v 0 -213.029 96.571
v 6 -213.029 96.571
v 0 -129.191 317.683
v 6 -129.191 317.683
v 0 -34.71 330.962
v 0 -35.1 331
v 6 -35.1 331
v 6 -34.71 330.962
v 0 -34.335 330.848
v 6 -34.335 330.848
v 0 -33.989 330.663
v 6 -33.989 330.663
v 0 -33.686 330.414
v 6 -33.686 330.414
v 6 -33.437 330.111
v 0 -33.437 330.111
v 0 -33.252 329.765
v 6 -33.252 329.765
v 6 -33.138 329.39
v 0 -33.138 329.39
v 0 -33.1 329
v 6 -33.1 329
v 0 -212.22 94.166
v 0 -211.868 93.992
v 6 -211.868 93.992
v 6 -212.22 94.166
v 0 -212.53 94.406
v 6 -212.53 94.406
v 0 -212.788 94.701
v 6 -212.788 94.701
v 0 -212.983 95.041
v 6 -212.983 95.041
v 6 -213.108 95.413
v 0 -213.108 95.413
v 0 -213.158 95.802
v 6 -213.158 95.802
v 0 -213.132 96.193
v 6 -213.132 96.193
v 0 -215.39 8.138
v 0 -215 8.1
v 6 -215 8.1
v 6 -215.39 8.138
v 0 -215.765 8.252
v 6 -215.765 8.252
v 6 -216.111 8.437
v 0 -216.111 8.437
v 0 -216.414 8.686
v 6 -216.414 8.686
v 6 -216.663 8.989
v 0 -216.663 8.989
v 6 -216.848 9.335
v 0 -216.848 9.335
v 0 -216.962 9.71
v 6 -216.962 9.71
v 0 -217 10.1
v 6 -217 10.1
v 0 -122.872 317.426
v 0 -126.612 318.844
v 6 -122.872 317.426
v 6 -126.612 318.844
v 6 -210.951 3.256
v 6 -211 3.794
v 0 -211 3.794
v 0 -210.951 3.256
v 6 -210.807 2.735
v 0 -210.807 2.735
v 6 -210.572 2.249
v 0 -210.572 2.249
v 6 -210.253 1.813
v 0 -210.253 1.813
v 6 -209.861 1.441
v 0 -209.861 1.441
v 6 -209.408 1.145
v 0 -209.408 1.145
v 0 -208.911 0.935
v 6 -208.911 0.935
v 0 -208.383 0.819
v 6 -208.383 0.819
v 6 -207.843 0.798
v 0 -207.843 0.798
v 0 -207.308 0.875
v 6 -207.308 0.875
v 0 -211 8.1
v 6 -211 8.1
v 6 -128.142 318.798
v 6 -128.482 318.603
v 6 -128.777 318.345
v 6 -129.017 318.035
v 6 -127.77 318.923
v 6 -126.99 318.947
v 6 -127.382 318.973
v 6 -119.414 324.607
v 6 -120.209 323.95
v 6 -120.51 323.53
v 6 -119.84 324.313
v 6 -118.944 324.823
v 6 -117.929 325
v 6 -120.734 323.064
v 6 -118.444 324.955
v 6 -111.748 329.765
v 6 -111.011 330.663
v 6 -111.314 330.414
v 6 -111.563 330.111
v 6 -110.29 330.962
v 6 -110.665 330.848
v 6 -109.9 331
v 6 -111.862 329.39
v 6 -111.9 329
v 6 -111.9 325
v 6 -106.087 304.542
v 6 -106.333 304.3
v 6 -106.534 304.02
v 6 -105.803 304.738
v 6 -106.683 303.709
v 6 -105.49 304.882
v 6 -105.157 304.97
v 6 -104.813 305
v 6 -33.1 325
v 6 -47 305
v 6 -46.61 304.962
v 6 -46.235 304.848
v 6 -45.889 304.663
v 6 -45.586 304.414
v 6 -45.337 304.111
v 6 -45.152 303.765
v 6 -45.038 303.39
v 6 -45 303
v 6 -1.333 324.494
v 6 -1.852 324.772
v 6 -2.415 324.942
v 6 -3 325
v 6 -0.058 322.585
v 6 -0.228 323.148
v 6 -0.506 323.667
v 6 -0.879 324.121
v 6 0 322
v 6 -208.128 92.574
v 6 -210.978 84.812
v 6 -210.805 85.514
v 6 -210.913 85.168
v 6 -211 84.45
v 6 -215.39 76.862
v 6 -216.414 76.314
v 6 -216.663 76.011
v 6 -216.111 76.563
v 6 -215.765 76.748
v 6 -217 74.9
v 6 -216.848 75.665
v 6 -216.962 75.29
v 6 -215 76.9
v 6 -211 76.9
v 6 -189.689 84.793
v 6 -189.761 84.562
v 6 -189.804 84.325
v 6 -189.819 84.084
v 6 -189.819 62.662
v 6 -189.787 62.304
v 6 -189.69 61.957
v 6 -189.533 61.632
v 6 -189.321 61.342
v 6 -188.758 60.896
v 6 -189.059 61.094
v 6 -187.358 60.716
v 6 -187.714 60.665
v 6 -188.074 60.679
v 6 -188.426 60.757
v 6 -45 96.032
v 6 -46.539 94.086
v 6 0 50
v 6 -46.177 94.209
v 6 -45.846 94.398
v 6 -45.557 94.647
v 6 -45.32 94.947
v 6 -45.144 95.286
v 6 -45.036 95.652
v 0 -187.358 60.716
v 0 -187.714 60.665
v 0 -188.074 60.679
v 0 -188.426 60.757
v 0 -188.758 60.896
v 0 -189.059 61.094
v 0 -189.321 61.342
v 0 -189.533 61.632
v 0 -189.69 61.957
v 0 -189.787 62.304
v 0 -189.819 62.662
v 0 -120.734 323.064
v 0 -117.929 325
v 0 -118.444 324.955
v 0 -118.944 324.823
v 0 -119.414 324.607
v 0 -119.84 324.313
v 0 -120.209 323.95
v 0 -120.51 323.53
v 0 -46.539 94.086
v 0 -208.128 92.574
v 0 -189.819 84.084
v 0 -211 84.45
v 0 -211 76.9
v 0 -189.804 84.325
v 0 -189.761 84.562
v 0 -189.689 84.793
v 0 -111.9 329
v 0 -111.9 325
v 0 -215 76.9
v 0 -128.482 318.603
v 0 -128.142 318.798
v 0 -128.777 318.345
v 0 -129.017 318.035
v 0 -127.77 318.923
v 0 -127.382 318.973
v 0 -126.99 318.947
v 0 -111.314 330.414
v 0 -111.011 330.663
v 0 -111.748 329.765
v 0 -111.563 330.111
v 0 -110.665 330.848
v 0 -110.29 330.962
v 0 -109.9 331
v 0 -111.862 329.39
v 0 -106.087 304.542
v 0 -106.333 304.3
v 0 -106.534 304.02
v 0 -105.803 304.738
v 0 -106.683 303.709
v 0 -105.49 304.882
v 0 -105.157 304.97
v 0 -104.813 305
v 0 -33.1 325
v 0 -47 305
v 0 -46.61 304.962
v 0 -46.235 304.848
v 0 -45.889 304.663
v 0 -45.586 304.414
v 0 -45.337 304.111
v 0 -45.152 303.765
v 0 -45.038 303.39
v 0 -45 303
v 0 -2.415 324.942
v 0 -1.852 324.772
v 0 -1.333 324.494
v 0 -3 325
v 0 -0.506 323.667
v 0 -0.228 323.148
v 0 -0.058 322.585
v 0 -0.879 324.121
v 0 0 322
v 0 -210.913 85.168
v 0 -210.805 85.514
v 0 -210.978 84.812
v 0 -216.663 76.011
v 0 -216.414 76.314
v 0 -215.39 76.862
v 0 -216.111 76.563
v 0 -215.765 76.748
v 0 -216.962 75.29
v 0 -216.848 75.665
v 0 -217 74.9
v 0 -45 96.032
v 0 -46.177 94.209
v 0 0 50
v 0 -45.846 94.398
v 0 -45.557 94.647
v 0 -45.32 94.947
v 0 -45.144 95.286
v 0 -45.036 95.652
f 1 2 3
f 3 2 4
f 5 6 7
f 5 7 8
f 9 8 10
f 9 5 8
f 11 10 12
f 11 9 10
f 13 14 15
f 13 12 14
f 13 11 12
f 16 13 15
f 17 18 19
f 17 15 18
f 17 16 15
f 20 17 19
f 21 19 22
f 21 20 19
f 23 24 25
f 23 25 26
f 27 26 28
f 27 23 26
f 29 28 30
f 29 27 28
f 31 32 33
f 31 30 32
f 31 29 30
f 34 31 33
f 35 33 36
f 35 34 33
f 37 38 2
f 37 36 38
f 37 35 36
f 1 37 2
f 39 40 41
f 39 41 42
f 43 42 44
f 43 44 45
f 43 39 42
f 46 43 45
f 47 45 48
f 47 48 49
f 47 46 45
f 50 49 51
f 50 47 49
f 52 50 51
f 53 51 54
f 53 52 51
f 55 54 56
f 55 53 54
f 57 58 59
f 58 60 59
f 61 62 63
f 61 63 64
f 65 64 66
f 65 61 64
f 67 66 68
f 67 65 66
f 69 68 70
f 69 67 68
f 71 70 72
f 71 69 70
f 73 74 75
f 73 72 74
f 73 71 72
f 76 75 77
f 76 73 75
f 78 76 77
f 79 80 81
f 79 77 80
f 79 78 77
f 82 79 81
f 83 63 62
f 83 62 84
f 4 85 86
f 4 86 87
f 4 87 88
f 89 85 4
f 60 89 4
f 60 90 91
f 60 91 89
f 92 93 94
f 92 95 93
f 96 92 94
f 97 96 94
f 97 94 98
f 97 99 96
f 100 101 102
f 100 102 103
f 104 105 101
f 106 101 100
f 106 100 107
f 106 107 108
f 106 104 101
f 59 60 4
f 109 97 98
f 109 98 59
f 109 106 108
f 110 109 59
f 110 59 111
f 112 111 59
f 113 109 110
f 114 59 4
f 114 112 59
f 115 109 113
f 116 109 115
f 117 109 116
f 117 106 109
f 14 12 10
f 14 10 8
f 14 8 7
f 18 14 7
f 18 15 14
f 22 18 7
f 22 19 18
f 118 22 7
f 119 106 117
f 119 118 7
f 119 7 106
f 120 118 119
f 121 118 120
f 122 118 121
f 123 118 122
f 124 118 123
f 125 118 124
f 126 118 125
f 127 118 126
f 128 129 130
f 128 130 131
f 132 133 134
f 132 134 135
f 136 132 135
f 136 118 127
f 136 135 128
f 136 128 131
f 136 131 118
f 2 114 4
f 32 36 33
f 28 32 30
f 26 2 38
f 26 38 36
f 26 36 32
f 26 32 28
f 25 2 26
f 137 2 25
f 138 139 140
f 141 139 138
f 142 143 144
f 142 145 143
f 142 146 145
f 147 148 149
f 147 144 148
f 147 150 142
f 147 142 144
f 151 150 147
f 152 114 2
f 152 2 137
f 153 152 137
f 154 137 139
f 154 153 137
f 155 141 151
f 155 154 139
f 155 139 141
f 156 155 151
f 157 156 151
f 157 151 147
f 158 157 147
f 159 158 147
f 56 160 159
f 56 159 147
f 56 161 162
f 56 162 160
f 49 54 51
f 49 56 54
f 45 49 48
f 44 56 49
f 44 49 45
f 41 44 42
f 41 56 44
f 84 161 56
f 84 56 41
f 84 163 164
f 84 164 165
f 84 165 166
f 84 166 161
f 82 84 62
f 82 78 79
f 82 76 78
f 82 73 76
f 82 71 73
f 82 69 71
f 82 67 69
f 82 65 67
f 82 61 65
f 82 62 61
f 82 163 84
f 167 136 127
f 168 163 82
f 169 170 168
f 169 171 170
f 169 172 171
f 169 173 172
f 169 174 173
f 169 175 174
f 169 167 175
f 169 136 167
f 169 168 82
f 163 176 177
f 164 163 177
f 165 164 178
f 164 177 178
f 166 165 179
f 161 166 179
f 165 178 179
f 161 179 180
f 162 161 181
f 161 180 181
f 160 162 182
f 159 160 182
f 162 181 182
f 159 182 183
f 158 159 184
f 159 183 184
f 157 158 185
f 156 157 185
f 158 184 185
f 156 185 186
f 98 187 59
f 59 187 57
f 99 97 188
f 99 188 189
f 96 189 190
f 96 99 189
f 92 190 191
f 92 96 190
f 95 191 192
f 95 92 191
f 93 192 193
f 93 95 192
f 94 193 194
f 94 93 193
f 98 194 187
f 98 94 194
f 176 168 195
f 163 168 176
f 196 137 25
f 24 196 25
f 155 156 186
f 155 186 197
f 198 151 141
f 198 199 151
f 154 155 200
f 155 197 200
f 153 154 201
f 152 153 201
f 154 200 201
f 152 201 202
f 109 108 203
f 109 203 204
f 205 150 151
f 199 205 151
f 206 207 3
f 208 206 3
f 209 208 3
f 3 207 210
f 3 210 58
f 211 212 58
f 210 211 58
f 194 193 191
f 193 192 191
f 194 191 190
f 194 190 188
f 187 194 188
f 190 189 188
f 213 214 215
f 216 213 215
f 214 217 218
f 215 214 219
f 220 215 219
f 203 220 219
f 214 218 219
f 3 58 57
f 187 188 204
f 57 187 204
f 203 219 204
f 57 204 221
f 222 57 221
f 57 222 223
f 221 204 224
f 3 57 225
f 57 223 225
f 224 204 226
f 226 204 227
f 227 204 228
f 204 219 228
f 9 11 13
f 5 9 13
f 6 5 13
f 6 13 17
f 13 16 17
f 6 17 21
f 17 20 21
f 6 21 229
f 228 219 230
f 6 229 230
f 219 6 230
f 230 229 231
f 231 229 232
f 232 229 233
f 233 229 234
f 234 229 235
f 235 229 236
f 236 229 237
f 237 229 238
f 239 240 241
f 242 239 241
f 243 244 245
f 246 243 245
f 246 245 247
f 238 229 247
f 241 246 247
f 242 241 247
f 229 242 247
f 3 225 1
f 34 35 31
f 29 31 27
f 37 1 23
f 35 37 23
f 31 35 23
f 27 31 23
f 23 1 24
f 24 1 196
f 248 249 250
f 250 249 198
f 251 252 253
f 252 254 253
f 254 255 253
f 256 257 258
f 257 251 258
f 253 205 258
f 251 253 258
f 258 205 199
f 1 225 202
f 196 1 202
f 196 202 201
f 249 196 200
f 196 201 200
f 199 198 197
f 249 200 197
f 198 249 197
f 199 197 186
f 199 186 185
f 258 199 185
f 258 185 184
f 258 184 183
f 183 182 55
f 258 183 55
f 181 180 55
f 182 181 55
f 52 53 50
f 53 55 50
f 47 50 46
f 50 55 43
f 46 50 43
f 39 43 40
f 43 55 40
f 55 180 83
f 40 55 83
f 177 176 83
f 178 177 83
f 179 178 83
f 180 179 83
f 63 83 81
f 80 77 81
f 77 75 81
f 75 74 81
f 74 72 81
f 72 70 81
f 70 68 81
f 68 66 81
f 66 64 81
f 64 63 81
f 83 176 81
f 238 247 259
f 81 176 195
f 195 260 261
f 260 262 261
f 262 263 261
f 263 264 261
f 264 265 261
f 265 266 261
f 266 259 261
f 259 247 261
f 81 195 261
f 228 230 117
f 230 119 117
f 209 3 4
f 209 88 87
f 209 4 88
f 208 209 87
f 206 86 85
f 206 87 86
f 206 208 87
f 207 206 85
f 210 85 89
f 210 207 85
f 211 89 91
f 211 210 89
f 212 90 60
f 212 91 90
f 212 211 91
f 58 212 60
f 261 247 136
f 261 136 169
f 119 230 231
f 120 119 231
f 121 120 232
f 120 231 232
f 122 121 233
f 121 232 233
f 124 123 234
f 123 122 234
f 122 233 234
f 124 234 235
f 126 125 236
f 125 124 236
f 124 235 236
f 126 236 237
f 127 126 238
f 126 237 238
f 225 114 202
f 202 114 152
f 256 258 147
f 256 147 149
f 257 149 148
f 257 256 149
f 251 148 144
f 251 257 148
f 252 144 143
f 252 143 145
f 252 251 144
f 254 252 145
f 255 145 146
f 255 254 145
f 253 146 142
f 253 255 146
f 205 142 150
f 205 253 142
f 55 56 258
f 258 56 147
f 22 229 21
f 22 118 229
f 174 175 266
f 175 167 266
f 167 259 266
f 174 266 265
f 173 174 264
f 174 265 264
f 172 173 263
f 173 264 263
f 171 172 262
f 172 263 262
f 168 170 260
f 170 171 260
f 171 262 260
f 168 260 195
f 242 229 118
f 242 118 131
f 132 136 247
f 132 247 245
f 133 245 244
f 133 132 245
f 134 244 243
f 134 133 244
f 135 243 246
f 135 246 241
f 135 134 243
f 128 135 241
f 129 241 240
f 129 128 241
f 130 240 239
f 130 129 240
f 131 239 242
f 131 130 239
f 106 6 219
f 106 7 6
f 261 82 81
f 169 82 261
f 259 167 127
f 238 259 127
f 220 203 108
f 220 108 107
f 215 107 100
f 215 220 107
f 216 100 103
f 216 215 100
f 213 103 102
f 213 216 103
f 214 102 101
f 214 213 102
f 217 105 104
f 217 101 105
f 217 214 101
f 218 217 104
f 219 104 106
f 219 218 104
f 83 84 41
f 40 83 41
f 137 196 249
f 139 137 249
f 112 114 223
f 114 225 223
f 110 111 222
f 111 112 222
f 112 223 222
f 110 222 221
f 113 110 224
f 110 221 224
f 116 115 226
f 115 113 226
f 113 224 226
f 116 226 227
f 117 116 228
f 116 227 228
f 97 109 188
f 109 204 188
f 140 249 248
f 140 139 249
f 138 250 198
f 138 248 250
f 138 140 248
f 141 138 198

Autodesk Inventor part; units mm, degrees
ref_plane "YZ Plane" through (0, 0, 0) normal (1, 0, 0) x (0, 1, 0)
ref_plane "XZ Plane" through (0, 0, 0) normal (0, 1, 0) x (-1, 0, 0)
ref_plane "XY Plane" through (0, 0, 0) normal (0, 0, 1) x (1, 0, 0)
sketch "Sketch1" plane through (0, 0, 0) normal (1, 0, 0) x (0, 1, 0)
  line L0 (0, 325) -> (0, 0)
  line L1 (0, 0) -> (-211, 0)
  line L2 (-211, 0) -> (-211, 85)
  line L3 (-2.414491, 325) -> (0, 325)
  line L4 (0, 325) -> (-120, 325)
  line L5 (-120, 325) -> (-211, 85)
  dimension "d0" = 325
  dimension "d1" = 211
  dimension "d2" = 85
  dimension "d3" = 120
  dimension "d33" = 240
  dimension "d34" = 91
extrude "Extrusion1" add sketch "Sketch1" along normal blind 6
sketch "Sketch2" plane through (6, 0, 0) normal (1, 0, 0) x (0, 0, -1)
  line L0 (-325, 0) -> (-325, -120) projected
  line L1 (-325, -33.1) -> (-331, -33.1)
  line L2 (-331, -33.1) -> (-331, -111.9)
  line L3 (-331, -111.9) -> (-325, -111.9)
  line L4 (-325, -111.9) -> (-325, -33.1)
  line L5 (-85, -211) -> (0, -211) projected
  line L6 (0, -211) -> (0, 0) projected
  line L7 (-76.9, -211) -> (-8.1, -211)
  line L8 (-8.1, -211) -> (-8.1, -217)
  line L9 (-8.1, -217) -> (-76.9, -217)
  line L10 (-76.9, -217) -> (-76.9, -211)
  line L11 (-325, -120) -> (-331, -111.9) construction
  line L12 (0, 0) -> (-325, 0) projected
  line L13 (-325, -25) -> (-331, -33.1) construction
  dimension "d6" = 6
  dimension "d12" = 6
  dimension "d13" = 8.1
  dimension "d38" = 25
  dimension "d47" = 8.1
  dimension "d48" = 8.1
extrude "Extrusion2" add sketch "Sketch2" against normal blind 6
sketch "Sketch3" plane through (6, 0, 0) normal (1, 0, 0) x (0, 0, -1)
  line L0 (-317.426159, -122.871748) -> (-92.573841, -208.128252)
  line L1 (-92.573841, -208.128252) -> (-94.701061, -213.738504)
  line L2 (-94.701061, -213.738504) -> (-319.55338, -128.482)
  line L3 (-319.55338, -128.482) -> (-317.426159, -122.871748)
  line L4 (-325, -120) -> (-85, -211)
  dimension "d17" = 8.1
  dimension "d35" = 6
  dimension "d36" = 8.1
extrude "Extrusion3" add sketch "Sketch3" against normal blind 6
sketch "Sketch6" plane through (6, 0, 0) normal (1, 0, 0) x (0, 0, -1)
  line L0 (0, 0) -> (-325, 0) projected
  line L1 (0, -211) -> (0, 0) projected
  line L2 (0, -211) -> (-50, 0)
  line L3 (-50, 0) -> (0, 0)
  line L4 (0, -211) -> (0, 0)
  dimension "d39" = 50
extrude "Extrusion6" cut sketch "Sketch6" against normal through all
fillet "Fillet2" radius 3 4 edges at (3, 0, 325) (3, -120, 325) (3, -211, 85) (3, -211, 0)
fillet "Fillet3" radius 2 6 edges at (3, -217, 8.1) (3, -217, 76.9) (3, -213.7385, 94.7011) (3, -128.482, 319.5534) (3, -111.9, 331) (3, -33.1, 331)
sketch "Sketch4" plane through (6, 0, 0) normal (1, 0, 0) x (0, 0, -1)
  line L0 (-323.06361, -120.734214) -> (-85.513953, -210.805126)
  line L1 (-323.06361, -120.734214) -> (-85.513953, -210.805126)
  line L2 (-50, 0) -> (-322, 0)
  line L3 (-325, -3) -> (-325, -33.1)
  line L4 (-325, -33.1) -> (-329, -33.1)
  line L5 (-305, -45) -> (-305, -106.193921)
  line L6 (-305, -106.193921) -> (-84.450343, -189.819)
  line L7 (-84.450343, -189.819) -> (-84.450343, -45)
  line L8 (-84.450343, -45) -> (-305, -45)
  arc A0 (-85.513953, -210.805126) -> (-84.450343, -211) centre (-84.450343, -208) ccw
  point P0 (-191.521346, -165.651434)
  point P1 (-106.085382, -201.605735)
  point P2 (-3, 0)
  point P3 (0, 0)
  dimension "d24" = 45
  dimension "d26" = 20
  dimension "d27" = 20
extrude "Extrusion4" cut sketch "Sketch4" against normal through all
sketch "Sketch7" plane through (6, 0, 0) normal (1, 0, 0) x (0, 0, -1)
  line L0 (-0.874821, -207.308256) -> (-50, 0)
  line L1 (-325, -33.1) -> (-329, -33.1)
  line L2 (-84.450343, -45) -> (-50.133044, -189.819)
  line L3 (-50.133044, -189.819) -> (-84.450343, -189.819)
  line L4 (-84.450343, -45) -> (-84.450343, -189.819)
  point P0 (0, 0)
extrude "Extrusion7" cut sketch "Sketch7" against normal through all
sketch "Sketch8" plane through (6, 0, 0) normal (1, 0, 0) x (0, 0, -1)
  line L0 (-84.450343, -45) -> (-50.133044, -189.819)
  line L1 (-305, -45) -> (-84.450343, -45)
  line L2 (-50.133044, -189.819) -> (-84.450343, -45)
  line L3 (-84.450343, -45) -> (-94.450343, -45)
  line L4 (-94.450343, -45) -> (-60.133044, -189.819)
  line L5 (-50.133044, -189.819) -> (-60.133044, -189.819)
  line L6 (-50.133044, -189.819) -> (-84.450343, -189.819)
  point P0 (0, 0)
  dimension "d44" = 10
extrude "Extrusion8" add sketch "Sketch8" against normal blind 6
fillet "Fillet4" radius 2 5 edges at (3, -189.819, 60.133) (3, -189.819, 84.4503) (3, -45, 94.4503) (3, -106.1939, 305) (3, -45, 305)
equation "\"d26\" = d27"
properties part number "TopSidePanel"
